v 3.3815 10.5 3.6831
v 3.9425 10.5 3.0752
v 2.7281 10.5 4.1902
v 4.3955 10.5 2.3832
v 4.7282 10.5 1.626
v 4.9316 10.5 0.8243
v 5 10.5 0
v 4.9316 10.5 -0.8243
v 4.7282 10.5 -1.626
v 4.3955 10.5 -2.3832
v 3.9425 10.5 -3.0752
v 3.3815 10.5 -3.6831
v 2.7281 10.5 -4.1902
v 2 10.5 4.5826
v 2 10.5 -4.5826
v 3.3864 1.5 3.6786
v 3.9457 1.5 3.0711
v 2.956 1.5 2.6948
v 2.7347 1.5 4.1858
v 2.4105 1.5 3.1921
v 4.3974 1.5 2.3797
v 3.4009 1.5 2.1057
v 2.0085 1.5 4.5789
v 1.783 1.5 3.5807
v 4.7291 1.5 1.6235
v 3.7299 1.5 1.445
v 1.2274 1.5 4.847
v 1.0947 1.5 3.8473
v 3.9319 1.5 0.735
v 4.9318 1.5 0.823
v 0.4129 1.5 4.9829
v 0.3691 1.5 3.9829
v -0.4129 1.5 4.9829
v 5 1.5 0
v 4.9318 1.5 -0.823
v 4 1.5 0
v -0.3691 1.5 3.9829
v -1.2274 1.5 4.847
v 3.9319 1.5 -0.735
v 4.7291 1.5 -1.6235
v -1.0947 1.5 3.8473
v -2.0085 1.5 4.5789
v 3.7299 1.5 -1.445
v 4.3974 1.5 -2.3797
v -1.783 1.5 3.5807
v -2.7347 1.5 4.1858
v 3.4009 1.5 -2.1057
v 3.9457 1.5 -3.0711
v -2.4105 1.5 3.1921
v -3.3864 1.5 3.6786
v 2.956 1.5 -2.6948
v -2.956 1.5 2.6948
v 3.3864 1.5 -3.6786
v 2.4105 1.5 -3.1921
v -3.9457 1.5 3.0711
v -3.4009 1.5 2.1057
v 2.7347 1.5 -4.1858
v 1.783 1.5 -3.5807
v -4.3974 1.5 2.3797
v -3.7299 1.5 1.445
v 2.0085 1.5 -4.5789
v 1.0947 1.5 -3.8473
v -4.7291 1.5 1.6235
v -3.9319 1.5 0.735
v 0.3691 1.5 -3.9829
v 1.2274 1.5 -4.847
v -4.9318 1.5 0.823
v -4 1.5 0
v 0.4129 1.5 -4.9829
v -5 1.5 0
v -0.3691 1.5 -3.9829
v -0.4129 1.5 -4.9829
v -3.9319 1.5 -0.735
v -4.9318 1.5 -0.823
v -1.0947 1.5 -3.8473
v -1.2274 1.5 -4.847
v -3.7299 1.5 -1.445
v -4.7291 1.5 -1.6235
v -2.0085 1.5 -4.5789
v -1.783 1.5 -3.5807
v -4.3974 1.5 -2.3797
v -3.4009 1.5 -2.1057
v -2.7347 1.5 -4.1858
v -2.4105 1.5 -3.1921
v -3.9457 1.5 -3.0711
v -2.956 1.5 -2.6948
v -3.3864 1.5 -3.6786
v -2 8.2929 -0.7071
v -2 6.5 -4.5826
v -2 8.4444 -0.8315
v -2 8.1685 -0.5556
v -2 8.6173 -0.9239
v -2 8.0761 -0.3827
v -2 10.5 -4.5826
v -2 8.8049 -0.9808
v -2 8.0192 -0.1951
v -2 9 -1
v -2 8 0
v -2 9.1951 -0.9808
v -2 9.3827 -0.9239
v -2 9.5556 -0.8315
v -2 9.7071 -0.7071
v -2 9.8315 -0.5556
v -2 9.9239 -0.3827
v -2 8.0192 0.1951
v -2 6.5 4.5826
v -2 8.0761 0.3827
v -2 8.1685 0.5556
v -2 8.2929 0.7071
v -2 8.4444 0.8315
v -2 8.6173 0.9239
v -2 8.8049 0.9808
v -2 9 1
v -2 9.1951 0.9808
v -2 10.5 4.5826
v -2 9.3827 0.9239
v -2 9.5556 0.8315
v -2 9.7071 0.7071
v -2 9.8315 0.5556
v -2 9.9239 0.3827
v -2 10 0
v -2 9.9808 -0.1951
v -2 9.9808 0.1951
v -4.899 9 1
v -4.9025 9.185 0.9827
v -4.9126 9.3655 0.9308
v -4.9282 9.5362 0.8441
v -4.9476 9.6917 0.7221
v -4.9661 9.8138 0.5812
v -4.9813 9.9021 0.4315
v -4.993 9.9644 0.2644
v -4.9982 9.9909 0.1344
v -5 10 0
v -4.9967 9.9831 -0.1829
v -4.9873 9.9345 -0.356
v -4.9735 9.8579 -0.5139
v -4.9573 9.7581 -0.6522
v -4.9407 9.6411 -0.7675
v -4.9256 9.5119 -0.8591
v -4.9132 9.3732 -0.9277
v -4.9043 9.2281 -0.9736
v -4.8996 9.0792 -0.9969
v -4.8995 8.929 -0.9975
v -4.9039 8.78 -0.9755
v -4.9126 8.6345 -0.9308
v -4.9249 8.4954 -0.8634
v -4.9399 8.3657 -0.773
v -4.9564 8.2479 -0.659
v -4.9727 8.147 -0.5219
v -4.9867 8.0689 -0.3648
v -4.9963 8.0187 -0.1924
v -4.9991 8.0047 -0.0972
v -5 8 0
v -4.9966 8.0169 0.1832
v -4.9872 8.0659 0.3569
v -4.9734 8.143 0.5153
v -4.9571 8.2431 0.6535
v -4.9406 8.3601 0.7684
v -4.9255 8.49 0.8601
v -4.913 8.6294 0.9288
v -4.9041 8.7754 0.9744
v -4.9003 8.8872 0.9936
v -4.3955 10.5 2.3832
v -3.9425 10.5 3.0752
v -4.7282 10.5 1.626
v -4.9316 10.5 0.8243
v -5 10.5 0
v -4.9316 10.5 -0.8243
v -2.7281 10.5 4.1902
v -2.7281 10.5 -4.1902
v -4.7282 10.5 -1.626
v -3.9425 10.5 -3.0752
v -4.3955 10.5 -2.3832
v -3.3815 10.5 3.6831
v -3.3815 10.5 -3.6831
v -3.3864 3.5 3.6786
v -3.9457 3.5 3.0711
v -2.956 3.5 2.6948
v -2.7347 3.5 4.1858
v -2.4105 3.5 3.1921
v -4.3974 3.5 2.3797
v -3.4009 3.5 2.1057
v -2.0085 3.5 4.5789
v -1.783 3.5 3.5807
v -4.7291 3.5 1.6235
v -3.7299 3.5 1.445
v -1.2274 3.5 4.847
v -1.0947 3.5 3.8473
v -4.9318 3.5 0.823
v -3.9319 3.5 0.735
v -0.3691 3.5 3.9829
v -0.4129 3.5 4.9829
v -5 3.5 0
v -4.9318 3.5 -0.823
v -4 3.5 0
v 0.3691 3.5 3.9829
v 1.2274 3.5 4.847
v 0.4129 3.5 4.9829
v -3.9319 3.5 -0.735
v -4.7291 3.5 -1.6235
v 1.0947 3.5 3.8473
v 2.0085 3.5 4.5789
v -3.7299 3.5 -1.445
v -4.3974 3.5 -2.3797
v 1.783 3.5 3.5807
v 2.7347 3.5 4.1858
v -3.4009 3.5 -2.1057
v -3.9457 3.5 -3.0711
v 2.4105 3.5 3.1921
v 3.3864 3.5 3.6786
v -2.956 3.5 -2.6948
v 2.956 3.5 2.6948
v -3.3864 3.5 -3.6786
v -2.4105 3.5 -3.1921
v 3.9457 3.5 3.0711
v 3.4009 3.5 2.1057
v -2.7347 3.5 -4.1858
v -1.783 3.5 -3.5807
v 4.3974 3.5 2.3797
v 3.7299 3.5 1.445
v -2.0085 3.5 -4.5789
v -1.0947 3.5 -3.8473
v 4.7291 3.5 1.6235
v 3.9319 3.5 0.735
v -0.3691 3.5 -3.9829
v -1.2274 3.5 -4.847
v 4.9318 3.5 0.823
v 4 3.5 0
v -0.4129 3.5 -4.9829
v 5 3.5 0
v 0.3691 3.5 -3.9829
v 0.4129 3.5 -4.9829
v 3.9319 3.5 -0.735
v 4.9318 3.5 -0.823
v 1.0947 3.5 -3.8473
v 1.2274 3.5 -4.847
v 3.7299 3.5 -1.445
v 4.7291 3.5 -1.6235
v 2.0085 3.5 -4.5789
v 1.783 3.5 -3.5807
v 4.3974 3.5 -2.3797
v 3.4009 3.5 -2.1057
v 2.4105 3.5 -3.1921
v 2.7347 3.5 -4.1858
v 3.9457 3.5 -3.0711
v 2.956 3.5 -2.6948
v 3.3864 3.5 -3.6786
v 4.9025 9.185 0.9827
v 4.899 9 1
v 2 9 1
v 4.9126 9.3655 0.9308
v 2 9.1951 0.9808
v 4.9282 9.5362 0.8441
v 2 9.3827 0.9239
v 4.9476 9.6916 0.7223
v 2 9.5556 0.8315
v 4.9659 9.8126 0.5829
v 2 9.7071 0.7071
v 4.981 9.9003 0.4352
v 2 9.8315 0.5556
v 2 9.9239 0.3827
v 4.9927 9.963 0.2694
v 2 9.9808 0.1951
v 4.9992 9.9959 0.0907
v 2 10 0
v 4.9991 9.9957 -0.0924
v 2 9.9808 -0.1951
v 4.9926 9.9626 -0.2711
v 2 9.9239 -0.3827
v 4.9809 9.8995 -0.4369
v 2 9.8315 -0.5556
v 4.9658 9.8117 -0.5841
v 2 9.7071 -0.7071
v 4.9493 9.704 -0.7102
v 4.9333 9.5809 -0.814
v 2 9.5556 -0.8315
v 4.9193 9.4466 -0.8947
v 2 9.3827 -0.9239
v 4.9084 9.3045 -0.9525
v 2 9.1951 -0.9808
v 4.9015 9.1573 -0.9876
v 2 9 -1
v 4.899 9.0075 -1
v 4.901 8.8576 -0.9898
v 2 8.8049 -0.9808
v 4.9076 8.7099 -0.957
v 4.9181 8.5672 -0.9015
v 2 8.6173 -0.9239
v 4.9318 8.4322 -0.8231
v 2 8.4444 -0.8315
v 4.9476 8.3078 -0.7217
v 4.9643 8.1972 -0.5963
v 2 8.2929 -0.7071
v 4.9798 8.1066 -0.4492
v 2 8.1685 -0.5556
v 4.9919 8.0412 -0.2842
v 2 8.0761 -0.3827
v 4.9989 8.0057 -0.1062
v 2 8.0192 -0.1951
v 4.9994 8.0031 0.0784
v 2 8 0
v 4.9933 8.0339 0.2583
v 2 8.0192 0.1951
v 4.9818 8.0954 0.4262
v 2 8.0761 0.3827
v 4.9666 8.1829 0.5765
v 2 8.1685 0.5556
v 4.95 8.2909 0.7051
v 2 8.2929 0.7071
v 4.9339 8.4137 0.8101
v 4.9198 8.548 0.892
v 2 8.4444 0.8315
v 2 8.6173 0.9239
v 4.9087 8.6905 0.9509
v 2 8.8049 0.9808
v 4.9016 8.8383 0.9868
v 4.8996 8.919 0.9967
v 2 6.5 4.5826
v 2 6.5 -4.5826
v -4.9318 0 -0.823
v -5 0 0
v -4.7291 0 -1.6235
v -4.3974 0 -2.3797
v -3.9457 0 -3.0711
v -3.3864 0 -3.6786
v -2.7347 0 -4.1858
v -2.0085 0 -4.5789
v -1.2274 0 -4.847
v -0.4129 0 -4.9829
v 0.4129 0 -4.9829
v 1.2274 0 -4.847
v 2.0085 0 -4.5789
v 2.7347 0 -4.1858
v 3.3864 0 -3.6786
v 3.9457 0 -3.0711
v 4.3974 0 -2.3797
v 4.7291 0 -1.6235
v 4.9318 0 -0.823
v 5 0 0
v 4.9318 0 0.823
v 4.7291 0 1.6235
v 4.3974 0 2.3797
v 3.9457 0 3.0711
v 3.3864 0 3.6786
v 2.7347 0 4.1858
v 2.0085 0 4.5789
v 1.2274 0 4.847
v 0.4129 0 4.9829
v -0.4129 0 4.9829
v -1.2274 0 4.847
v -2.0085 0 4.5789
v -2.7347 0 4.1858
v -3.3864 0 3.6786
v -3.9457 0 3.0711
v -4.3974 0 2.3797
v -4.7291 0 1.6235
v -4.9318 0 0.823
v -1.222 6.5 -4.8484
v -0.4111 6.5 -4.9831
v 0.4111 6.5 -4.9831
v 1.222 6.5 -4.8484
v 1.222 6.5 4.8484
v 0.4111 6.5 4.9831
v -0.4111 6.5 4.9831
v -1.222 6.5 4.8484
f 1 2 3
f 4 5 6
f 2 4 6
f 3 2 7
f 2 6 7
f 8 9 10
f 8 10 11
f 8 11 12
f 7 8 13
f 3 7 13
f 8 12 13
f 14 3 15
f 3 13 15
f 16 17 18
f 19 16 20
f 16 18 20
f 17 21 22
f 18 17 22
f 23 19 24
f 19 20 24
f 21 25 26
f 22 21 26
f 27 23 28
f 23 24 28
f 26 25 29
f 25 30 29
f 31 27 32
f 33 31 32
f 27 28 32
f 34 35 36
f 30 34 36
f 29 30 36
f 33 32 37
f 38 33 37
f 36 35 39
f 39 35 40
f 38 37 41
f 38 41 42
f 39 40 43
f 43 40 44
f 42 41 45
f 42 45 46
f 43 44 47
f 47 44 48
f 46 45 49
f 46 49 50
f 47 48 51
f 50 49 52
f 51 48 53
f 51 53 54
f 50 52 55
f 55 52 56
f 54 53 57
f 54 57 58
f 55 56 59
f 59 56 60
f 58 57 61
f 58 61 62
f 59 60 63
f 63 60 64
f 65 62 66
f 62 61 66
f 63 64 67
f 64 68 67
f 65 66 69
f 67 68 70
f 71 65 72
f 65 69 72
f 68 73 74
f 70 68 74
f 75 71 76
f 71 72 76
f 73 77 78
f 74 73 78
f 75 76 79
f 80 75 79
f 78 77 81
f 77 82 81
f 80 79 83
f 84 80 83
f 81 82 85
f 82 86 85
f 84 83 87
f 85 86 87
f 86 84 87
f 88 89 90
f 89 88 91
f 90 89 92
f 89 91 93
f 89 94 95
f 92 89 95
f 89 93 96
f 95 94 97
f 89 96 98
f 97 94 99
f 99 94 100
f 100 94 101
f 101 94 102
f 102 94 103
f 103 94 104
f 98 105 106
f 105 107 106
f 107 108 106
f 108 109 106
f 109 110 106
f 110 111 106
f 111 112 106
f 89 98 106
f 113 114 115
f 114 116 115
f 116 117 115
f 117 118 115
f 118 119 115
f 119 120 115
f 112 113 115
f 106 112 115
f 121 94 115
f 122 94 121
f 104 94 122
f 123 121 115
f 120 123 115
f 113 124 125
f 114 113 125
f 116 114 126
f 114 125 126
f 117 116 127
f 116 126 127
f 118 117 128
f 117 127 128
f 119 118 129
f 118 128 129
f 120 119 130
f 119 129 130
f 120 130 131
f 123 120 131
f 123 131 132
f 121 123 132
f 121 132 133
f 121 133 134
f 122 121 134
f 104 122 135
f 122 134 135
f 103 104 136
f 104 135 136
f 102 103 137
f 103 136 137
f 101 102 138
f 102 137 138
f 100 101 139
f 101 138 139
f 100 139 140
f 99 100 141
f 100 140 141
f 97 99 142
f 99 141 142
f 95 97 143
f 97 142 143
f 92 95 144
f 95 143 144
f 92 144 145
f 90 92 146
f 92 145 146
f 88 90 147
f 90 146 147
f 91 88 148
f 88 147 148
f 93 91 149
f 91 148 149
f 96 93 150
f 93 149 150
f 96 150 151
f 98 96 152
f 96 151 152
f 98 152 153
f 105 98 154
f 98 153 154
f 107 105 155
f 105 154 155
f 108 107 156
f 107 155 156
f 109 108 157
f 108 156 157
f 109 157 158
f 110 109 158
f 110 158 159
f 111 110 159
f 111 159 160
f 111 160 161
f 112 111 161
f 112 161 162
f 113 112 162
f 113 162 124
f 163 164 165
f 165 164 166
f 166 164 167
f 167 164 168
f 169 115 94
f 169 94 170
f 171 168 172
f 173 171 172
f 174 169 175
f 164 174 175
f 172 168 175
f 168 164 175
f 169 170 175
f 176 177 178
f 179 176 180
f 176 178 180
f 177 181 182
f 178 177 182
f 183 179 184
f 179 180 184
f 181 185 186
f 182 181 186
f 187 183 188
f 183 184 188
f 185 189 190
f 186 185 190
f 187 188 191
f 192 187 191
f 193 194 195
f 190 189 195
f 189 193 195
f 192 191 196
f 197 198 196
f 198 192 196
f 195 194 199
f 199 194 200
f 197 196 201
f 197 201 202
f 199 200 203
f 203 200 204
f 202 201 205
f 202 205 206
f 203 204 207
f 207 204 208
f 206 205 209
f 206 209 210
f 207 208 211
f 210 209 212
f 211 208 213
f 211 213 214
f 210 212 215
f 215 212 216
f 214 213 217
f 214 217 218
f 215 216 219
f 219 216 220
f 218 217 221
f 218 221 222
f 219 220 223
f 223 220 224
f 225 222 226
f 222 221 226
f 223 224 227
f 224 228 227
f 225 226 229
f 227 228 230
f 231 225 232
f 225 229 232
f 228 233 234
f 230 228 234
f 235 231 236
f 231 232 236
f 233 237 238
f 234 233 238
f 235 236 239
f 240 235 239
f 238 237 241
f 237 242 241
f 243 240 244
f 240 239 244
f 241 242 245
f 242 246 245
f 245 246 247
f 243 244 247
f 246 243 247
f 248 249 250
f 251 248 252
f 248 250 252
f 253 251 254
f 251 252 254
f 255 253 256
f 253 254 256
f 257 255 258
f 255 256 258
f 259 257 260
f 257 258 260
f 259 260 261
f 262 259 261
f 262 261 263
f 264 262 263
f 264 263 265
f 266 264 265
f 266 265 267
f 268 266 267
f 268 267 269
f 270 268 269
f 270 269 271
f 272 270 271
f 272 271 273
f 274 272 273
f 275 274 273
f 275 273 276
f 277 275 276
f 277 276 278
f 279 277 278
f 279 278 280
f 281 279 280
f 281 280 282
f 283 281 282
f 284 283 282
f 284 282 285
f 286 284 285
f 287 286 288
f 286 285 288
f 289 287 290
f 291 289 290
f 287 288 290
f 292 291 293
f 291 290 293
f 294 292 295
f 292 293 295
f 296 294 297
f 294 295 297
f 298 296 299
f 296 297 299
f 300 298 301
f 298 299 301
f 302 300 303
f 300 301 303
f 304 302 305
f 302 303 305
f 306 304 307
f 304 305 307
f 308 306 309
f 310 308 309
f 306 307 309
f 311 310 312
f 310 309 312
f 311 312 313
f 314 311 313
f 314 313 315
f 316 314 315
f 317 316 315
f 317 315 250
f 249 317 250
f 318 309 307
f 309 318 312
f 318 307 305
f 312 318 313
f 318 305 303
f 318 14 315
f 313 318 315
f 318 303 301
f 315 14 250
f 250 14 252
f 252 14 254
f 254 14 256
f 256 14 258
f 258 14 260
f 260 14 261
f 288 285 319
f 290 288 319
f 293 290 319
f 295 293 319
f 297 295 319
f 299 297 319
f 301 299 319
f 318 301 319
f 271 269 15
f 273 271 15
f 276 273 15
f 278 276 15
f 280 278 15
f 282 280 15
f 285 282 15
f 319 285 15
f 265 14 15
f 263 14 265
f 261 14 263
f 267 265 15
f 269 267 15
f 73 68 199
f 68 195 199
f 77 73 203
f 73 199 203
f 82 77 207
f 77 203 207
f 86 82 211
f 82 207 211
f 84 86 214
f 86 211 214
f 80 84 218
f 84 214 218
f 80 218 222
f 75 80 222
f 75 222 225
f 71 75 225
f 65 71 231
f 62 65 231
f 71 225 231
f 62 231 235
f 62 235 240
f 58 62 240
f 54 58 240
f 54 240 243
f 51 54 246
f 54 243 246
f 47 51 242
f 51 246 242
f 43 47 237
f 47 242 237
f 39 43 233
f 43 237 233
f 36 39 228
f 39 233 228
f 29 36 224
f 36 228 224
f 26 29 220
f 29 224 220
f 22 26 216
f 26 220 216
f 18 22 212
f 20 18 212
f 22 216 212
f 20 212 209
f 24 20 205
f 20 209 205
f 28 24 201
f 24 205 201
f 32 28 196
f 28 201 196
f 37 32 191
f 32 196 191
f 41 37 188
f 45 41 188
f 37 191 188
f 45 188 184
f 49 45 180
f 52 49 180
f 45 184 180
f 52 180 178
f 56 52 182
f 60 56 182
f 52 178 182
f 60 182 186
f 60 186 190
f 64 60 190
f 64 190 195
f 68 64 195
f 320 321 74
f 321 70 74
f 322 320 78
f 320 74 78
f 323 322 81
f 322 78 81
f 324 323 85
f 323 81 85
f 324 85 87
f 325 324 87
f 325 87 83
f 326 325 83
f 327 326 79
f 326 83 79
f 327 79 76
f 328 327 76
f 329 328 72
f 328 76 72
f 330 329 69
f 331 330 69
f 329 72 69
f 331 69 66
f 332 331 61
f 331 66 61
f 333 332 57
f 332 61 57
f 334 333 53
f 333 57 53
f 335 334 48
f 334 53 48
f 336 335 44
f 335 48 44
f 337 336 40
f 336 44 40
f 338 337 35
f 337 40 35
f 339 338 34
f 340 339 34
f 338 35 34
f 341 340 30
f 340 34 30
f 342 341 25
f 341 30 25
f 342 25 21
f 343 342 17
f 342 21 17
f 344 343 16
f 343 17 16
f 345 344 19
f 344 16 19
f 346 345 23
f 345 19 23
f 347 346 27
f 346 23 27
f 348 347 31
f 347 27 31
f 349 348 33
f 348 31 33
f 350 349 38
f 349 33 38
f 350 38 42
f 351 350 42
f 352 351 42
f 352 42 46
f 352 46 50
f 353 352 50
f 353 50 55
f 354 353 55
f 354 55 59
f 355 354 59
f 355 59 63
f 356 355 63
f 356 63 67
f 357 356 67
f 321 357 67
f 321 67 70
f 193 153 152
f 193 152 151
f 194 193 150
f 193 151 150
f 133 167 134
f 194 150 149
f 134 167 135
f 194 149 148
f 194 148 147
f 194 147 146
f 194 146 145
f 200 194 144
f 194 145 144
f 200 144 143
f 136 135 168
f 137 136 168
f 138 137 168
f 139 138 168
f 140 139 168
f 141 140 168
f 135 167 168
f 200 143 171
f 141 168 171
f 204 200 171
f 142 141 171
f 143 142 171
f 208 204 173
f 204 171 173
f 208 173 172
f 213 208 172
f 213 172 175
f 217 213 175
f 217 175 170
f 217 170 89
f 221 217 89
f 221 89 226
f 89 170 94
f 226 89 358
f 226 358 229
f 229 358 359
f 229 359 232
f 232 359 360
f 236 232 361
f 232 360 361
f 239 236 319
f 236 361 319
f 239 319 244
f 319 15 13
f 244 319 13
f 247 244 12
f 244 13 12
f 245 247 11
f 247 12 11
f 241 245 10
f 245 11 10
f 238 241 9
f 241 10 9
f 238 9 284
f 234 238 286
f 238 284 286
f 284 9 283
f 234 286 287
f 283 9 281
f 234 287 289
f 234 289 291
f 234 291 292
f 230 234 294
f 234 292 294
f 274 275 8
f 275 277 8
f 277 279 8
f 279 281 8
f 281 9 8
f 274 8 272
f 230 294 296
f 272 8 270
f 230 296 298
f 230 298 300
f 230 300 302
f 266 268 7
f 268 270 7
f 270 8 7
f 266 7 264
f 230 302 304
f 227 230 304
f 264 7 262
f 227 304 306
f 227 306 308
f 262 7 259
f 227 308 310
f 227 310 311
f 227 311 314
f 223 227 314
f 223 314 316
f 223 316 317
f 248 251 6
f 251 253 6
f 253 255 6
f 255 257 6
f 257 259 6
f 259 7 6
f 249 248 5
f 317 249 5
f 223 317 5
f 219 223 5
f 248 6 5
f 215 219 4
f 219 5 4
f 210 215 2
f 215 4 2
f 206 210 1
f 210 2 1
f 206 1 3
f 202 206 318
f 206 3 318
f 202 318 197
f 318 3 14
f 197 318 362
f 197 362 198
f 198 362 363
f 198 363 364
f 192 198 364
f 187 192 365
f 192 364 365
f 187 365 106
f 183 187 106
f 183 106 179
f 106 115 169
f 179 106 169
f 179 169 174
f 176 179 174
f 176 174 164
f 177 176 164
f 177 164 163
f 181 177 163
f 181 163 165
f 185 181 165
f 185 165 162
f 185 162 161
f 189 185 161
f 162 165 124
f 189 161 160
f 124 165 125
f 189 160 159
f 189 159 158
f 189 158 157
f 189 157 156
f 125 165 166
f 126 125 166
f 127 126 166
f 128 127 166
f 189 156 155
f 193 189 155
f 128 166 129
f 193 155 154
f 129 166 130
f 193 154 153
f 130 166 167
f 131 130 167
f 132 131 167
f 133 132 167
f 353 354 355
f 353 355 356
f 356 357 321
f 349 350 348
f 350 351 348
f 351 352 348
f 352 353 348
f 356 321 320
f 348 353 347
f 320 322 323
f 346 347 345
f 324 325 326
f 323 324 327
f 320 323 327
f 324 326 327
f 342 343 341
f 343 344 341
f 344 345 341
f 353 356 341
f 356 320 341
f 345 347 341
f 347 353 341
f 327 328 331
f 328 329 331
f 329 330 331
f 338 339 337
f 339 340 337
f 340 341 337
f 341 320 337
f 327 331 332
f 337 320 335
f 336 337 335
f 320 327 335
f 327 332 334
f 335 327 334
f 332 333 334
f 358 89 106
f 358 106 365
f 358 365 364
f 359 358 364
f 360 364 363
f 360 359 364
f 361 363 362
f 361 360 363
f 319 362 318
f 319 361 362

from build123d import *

# Parameters (mm, degrees)
CUT_EXTRUDE1_DEPTH    = 4
F_2_0MM_DOWEL_HOLE1_D = 2


with BuildPart() as part:
    # Sketch2 → Revolve1 (revolve)
    with BuildSketch(Plane.XY, mode=Mode.PRIVATE) as revolve1_sk:
        Polygon((0, 0), (5, 0), (5, 1.5), (4, 1.5), (4, 3.5), (5, 3.5), (5, 10.5), (0, 10.5), align=None)
    revolve(revolve1_sk.sketch.rotate(Axis((0, 10.5, 0), (0, -1, 0)), 180), axis=Axis((0, 10.5, 0), (0, -1, 0)))

    # Sketch3 → Cut-Extrude1 (cut)
    with BuildSketch(Plane(origin=(0, 10.5, 0), x_dir=(1, 0, 0), z_dir=(0, 1, 0))):
        with BuildLine():
            Line((-2, 4.582575695), (-2, -4.582575695))
            ThreePointArc((-2, -4.582575695), (0, -5), (2, -4.582575695))
            Line((2, -4.582575695), (2, 4.582575695))
            ThreePointArc((2, 4.582575695), (0, 5), (-2, 4.582575695))
        make_face()
    extrude(amount=-CUT_EXTRUDE1_DEPTH, mode=Mode.SUBTRACT)

    # Ø2.0mm Dowel Hole1 (through all)
    with Locations(Plane(origin=(5, 0, 0), x_dir=(0, 0, -1), z_dir=(1, 0, 0))):
        with Locations((0, 9)):
            Hole(F_2_0MM_DOWEL_HOLE1_D / 2)


solid = part.part
